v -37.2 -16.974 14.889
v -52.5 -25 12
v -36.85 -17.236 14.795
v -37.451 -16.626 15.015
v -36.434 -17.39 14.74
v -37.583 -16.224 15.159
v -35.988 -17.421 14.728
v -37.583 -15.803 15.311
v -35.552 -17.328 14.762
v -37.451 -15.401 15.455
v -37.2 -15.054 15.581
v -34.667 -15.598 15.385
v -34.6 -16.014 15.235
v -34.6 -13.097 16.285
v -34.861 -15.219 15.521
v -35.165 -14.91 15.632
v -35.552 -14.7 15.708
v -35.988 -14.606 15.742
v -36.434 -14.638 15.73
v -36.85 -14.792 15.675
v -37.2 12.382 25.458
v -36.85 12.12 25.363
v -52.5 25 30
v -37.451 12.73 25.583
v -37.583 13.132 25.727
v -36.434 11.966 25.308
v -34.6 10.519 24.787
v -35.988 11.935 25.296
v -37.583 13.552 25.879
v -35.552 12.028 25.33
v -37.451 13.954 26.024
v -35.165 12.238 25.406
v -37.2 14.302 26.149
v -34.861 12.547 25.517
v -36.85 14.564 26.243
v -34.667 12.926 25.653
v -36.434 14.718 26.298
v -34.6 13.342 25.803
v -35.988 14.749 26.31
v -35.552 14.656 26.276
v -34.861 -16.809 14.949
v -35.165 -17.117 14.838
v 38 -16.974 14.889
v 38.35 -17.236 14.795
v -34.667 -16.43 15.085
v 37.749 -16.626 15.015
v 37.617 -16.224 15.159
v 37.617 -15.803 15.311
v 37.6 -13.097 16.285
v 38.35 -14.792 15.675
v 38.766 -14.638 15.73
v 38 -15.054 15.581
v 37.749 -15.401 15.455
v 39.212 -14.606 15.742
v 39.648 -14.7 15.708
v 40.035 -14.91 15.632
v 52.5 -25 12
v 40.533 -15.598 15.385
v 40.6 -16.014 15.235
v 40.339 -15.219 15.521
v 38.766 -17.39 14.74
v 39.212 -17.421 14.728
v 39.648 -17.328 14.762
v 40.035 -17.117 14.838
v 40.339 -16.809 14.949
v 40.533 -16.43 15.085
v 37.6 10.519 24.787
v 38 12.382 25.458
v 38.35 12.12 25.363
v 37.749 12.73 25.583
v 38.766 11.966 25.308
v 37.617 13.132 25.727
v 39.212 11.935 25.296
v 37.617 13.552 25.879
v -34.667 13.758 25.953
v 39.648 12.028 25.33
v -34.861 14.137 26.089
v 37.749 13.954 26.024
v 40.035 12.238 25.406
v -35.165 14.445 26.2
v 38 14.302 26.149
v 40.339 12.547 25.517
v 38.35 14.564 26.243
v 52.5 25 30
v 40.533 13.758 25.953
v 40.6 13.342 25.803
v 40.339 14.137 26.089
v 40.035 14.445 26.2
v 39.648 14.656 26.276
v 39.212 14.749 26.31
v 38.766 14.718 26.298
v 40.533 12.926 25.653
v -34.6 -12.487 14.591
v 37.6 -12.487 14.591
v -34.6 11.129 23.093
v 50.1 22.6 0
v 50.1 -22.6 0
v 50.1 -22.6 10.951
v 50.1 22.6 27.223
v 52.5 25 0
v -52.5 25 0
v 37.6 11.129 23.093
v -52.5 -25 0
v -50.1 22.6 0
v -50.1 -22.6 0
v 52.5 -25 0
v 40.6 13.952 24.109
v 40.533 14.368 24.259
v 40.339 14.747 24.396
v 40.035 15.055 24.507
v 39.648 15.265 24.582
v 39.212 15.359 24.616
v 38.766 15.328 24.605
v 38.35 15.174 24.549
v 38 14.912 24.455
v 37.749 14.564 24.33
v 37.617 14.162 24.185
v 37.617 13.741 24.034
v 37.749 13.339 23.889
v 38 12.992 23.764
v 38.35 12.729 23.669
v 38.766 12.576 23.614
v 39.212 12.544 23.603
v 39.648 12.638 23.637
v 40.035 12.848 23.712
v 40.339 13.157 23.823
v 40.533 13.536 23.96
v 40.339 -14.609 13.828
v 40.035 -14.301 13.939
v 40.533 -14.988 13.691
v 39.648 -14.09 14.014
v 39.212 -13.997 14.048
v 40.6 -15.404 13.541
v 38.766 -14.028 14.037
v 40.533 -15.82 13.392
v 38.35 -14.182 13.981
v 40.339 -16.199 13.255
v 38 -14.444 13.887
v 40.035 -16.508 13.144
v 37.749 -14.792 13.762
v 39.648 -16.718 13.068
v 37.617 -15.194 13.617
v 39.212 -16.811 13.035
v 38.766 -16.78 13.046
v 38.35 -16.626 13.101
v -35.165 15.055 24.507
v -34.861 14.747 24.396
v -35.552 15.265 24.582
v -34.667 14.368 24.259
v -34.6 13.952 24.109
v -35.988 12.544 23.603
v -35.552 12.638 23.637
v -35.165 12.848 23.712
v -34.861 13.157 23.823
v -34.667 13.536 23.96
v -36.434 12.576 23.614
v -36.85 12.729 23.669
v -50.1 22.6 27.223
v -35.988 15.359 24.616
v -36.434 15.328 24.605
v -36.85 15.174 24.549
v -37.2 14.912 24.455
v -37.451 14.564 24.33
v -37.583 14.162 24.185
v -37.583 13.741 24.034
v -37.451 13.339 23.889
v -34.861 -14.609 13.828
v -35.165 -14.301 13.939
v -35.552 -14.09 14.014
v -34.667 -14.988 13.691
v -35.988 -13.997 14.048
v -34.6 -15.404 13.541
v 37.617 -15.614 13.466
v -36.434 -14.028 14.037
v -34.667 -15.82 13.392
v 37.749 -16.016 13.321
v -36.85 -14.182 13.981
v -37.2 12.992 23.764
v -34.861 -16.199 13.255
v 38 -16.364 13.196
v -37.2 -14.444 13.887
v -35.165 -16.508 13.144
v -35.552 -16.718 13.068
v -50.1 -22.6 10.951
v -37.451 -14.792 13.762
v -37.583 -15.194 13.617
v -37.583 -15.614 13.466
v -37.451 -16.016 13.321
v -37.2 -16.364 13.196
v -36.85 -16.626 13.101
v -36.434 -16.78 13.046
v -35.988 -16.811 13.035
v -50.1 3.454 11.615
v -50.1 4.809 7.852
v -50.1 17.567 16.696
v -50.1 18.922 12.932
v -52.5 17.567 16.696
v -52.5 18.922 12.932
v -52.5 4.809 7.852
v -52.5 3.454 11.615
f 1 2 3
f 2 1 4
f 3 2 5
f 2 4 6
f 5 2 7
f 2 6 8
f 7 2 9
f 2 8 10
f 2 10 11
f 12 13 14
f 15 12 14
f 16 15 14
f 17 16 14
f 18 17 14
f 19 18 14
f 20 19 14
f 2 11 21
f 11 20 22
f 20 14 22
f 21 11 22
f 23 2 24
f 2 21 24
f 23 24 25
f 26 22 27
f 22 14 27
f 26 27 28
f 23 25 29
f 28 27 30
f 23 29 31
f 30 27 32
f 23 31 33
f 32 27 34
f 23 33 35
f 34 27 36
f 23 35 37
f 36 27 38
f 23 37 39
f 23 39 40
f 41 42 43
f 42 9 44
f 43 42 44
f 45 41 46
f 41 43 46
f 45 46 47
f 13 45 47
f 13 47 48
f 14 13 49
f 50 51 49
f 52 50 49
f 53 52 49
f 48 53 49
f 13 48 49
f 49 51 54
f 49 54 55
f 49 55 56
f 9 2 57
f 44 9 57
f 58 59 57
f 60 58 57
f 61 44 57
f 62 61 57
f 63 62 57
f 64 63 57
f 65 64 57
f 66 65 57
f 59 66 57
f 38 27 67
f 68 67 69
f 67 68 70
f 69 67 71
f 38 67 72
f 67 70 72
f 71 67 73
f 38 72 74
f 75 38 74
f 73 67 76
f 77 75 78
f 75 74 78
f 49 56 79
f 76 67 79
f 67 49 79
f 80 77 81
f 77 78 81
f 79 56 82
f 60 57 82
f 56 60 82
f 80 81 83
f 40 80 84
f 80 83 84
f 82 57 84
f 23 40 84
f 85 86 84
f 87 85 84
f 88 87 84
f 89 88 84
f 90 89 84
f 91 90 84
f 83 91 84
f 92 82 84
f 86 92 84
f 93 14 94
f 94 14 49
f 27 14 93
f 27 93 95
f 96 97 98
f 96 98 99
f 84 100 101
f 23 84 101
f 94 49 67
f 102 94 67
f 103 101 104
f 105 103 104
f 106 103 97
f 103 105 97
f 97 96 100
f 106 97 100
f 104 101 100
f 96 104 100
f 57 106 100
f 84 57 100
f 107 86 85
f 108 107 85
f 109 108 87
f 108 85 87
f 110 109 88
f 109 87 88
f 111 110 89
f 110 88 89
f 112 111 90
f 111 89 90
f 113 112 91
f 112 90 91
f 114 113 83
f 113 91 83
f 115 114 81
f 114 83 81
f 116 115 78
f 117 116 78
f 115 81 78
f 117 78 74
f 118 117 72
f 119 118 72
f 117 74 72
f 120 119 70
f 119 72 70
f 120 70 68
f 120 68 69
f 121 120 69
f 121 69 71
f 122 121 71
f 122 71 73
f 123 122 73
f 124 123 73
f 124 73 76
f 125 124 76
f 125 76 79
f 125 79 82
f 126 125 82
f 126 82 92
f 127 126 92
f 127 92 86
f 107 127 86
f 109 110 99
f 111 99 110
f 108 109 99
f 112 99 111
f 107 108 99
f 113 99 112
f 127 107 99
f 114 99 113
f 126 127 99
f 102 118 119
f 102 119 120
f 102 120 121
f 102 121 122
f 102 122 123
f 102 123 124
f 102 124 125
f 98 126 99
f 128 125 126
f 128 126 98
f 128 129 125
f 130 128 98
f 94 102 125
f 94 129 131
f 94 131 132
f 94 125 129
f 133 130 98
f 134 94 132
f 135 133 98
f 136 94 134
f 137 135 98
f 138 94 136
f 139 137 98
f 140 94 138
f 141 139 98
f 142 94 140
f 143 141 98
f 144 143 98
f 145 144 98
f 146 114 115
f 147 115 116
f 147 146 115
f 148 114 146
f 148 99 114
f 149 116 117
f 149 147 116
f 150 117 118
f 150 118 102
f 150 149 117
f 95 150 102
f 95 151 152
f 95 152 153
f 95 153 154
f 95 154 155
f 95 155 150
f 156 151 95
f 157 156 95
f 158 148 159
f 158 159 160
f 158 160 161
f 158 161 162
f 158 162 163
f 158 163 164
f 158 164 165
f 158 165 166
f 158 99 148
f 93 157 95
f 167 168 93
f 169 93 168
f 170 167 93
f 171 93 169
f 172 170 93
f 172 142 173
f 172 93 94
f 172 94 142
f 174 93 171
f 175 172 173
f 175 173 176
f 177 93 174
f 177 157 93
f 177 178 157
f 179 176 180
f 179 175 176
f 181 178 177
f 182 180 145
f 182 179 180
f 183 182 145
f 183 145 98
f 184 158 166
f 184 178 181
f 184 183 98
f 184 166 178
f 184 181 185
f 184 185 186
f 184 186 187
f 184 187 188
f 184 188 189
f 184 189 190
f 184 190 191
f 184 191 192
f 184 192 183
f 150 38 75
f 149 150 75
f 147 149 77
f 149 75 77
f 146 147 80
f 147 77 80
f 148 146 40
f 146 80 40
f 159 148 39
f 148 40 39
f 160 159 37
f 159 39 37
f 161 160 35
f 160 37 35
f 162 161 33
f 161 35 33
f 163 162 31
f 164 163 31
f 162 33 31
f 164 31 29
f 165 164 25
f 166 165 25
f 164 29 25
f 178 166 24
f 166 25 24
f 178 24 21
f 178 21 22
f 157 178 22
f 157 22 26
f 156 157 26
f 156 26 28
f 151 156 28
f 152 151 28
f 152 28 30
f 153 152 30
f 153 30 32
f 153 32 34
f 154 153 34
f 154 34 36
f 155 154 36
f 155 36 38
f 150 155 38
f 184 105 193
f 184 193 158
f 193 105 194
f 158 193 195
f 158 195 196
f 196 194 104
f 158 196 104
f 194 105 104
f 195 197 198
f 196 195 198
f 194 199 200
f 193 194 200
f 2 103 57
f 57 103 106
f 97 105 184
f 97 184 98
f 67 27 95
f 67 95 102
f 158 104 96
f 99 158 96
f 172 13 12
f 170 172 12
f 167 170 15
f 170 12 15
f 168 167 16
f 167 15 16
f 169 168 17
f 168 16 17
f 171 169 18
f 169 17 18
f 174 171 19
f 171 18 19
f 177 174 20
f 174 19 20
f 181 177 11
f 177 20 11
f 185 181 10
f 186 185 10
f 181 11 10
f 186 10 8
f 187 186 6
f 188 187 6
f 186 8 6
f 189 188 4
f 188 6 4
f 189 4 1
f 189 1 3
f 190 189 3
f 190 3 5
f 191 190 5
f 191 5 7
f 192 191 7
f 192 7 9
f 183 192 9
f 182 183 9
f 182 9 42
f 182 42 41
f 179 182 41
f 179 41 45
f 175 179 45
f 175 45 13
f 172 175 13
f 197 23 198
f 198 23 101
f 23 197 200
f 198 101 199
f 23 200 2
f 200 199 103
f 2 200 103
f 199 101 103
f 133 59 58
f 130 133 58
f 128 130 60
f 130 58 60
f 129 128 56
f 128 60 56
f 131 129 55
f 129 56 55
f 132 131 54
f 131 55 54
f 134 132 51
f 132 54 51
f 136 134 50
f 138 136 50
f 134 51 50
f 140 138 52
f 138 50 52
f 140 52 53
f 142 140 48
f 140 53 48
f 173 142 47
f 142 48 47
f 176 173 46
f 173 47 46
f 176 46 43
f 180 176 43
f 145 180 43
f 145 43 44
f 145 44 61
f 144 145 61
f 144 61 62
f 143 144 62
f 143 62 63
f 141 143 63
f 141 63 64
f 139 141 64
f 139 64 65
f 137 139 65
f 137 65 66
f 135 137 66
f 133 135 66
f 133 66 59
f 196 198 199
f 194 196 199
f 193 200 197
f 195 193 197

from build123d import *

# Parameters (mm, degrees)
F0_W     = 100.2
F0_H     = 45.2
F1_DEPTH = 30
F3_DEPTH = 105.001
F6_DEPTH = 105
F4_W     = 72.2
F4_H     = 25.1
F4_R     = 1.5
F7_DEPTH = 5
F8_DEPTH = 5


with BuildPart() as f1:
    # F0 (on Top) → F1 (new body)
    with BuildSketch(Plane.XY):
        Polygon((52.5, 25), (-52.5, 25), (-52.5, 4), (-52.5, -4), (-52.5, -25), (52.5, -25), (52.5, -4), (52.5, 4), align=None)
        Rectangle(F0_W, F0_H, mode=Mode.SUBTRACT)
    extrude(amount=F1_DEPTH)

    # F2 (on face) → F3 (cut, through all)
    with BuildSketch(Plane.YZ.offset(52.5)):
        Polygon((-25, 12), (25, 30), (-25, 30), align=None)
    extrude(amount=-F3_DEPTH, mode=Mode.SUBTRACT)

    # F5 (on face) → F6 (join)
    with BuildSketch(Plane(origin=(-52.5, 0, 0), x_dir=(0, -1, 0), z_dir=(-1, 0, 0))):
        Polygon((25, 12), (-25, 30), (-25, 28.0869124432), (25, 10.0869124432), align=None)
    extrude(amount=-F6_DEPTH)

    # F4 (on face) → F7 (cut)
    with BuildSketch(Plane(origin=(0, -6.6926345609, 18.5906515581), x_dir=(1, 0, 0), z_dir=(0, -0.3387194683, 0.9408874119))):
        with Locations((1.5, 5.7432311296)):
            Rectangle(F4_W, F4_H)
        with Locations((39.1, -9.9067688704)):
            Circle(F4_R)
        with Locations((39.1, 21.2932311296)):
            Circle(F4_R)
        with Locations((-36.1, -9.9067688704)):
            Circle(F4_R)
        with Locations((-36.1, 21.2932311296)):
            Circle(F4_R)
    extrude(amount=-F7_DEPTH, mode=Mode.SUBTRACT)

    # F5 (on face) → F8 (cut)
    with BuildSketch(Plane(origin=(-52.5, 0, 0), x_dir=(0, -1, 0), z_dir=(-1, 0, 0))):
        Polygon((-3.4536782682, 11.6150599721), (-17.5669894462, 16.6958519962), (-18.9218673193, 12.9323023487), (-4.8085561413, 7.8515103246), align=None)
    extrude(amount=-F8_DEPTH, mode=Mode.SUBTRACT)


solid = f1.part
